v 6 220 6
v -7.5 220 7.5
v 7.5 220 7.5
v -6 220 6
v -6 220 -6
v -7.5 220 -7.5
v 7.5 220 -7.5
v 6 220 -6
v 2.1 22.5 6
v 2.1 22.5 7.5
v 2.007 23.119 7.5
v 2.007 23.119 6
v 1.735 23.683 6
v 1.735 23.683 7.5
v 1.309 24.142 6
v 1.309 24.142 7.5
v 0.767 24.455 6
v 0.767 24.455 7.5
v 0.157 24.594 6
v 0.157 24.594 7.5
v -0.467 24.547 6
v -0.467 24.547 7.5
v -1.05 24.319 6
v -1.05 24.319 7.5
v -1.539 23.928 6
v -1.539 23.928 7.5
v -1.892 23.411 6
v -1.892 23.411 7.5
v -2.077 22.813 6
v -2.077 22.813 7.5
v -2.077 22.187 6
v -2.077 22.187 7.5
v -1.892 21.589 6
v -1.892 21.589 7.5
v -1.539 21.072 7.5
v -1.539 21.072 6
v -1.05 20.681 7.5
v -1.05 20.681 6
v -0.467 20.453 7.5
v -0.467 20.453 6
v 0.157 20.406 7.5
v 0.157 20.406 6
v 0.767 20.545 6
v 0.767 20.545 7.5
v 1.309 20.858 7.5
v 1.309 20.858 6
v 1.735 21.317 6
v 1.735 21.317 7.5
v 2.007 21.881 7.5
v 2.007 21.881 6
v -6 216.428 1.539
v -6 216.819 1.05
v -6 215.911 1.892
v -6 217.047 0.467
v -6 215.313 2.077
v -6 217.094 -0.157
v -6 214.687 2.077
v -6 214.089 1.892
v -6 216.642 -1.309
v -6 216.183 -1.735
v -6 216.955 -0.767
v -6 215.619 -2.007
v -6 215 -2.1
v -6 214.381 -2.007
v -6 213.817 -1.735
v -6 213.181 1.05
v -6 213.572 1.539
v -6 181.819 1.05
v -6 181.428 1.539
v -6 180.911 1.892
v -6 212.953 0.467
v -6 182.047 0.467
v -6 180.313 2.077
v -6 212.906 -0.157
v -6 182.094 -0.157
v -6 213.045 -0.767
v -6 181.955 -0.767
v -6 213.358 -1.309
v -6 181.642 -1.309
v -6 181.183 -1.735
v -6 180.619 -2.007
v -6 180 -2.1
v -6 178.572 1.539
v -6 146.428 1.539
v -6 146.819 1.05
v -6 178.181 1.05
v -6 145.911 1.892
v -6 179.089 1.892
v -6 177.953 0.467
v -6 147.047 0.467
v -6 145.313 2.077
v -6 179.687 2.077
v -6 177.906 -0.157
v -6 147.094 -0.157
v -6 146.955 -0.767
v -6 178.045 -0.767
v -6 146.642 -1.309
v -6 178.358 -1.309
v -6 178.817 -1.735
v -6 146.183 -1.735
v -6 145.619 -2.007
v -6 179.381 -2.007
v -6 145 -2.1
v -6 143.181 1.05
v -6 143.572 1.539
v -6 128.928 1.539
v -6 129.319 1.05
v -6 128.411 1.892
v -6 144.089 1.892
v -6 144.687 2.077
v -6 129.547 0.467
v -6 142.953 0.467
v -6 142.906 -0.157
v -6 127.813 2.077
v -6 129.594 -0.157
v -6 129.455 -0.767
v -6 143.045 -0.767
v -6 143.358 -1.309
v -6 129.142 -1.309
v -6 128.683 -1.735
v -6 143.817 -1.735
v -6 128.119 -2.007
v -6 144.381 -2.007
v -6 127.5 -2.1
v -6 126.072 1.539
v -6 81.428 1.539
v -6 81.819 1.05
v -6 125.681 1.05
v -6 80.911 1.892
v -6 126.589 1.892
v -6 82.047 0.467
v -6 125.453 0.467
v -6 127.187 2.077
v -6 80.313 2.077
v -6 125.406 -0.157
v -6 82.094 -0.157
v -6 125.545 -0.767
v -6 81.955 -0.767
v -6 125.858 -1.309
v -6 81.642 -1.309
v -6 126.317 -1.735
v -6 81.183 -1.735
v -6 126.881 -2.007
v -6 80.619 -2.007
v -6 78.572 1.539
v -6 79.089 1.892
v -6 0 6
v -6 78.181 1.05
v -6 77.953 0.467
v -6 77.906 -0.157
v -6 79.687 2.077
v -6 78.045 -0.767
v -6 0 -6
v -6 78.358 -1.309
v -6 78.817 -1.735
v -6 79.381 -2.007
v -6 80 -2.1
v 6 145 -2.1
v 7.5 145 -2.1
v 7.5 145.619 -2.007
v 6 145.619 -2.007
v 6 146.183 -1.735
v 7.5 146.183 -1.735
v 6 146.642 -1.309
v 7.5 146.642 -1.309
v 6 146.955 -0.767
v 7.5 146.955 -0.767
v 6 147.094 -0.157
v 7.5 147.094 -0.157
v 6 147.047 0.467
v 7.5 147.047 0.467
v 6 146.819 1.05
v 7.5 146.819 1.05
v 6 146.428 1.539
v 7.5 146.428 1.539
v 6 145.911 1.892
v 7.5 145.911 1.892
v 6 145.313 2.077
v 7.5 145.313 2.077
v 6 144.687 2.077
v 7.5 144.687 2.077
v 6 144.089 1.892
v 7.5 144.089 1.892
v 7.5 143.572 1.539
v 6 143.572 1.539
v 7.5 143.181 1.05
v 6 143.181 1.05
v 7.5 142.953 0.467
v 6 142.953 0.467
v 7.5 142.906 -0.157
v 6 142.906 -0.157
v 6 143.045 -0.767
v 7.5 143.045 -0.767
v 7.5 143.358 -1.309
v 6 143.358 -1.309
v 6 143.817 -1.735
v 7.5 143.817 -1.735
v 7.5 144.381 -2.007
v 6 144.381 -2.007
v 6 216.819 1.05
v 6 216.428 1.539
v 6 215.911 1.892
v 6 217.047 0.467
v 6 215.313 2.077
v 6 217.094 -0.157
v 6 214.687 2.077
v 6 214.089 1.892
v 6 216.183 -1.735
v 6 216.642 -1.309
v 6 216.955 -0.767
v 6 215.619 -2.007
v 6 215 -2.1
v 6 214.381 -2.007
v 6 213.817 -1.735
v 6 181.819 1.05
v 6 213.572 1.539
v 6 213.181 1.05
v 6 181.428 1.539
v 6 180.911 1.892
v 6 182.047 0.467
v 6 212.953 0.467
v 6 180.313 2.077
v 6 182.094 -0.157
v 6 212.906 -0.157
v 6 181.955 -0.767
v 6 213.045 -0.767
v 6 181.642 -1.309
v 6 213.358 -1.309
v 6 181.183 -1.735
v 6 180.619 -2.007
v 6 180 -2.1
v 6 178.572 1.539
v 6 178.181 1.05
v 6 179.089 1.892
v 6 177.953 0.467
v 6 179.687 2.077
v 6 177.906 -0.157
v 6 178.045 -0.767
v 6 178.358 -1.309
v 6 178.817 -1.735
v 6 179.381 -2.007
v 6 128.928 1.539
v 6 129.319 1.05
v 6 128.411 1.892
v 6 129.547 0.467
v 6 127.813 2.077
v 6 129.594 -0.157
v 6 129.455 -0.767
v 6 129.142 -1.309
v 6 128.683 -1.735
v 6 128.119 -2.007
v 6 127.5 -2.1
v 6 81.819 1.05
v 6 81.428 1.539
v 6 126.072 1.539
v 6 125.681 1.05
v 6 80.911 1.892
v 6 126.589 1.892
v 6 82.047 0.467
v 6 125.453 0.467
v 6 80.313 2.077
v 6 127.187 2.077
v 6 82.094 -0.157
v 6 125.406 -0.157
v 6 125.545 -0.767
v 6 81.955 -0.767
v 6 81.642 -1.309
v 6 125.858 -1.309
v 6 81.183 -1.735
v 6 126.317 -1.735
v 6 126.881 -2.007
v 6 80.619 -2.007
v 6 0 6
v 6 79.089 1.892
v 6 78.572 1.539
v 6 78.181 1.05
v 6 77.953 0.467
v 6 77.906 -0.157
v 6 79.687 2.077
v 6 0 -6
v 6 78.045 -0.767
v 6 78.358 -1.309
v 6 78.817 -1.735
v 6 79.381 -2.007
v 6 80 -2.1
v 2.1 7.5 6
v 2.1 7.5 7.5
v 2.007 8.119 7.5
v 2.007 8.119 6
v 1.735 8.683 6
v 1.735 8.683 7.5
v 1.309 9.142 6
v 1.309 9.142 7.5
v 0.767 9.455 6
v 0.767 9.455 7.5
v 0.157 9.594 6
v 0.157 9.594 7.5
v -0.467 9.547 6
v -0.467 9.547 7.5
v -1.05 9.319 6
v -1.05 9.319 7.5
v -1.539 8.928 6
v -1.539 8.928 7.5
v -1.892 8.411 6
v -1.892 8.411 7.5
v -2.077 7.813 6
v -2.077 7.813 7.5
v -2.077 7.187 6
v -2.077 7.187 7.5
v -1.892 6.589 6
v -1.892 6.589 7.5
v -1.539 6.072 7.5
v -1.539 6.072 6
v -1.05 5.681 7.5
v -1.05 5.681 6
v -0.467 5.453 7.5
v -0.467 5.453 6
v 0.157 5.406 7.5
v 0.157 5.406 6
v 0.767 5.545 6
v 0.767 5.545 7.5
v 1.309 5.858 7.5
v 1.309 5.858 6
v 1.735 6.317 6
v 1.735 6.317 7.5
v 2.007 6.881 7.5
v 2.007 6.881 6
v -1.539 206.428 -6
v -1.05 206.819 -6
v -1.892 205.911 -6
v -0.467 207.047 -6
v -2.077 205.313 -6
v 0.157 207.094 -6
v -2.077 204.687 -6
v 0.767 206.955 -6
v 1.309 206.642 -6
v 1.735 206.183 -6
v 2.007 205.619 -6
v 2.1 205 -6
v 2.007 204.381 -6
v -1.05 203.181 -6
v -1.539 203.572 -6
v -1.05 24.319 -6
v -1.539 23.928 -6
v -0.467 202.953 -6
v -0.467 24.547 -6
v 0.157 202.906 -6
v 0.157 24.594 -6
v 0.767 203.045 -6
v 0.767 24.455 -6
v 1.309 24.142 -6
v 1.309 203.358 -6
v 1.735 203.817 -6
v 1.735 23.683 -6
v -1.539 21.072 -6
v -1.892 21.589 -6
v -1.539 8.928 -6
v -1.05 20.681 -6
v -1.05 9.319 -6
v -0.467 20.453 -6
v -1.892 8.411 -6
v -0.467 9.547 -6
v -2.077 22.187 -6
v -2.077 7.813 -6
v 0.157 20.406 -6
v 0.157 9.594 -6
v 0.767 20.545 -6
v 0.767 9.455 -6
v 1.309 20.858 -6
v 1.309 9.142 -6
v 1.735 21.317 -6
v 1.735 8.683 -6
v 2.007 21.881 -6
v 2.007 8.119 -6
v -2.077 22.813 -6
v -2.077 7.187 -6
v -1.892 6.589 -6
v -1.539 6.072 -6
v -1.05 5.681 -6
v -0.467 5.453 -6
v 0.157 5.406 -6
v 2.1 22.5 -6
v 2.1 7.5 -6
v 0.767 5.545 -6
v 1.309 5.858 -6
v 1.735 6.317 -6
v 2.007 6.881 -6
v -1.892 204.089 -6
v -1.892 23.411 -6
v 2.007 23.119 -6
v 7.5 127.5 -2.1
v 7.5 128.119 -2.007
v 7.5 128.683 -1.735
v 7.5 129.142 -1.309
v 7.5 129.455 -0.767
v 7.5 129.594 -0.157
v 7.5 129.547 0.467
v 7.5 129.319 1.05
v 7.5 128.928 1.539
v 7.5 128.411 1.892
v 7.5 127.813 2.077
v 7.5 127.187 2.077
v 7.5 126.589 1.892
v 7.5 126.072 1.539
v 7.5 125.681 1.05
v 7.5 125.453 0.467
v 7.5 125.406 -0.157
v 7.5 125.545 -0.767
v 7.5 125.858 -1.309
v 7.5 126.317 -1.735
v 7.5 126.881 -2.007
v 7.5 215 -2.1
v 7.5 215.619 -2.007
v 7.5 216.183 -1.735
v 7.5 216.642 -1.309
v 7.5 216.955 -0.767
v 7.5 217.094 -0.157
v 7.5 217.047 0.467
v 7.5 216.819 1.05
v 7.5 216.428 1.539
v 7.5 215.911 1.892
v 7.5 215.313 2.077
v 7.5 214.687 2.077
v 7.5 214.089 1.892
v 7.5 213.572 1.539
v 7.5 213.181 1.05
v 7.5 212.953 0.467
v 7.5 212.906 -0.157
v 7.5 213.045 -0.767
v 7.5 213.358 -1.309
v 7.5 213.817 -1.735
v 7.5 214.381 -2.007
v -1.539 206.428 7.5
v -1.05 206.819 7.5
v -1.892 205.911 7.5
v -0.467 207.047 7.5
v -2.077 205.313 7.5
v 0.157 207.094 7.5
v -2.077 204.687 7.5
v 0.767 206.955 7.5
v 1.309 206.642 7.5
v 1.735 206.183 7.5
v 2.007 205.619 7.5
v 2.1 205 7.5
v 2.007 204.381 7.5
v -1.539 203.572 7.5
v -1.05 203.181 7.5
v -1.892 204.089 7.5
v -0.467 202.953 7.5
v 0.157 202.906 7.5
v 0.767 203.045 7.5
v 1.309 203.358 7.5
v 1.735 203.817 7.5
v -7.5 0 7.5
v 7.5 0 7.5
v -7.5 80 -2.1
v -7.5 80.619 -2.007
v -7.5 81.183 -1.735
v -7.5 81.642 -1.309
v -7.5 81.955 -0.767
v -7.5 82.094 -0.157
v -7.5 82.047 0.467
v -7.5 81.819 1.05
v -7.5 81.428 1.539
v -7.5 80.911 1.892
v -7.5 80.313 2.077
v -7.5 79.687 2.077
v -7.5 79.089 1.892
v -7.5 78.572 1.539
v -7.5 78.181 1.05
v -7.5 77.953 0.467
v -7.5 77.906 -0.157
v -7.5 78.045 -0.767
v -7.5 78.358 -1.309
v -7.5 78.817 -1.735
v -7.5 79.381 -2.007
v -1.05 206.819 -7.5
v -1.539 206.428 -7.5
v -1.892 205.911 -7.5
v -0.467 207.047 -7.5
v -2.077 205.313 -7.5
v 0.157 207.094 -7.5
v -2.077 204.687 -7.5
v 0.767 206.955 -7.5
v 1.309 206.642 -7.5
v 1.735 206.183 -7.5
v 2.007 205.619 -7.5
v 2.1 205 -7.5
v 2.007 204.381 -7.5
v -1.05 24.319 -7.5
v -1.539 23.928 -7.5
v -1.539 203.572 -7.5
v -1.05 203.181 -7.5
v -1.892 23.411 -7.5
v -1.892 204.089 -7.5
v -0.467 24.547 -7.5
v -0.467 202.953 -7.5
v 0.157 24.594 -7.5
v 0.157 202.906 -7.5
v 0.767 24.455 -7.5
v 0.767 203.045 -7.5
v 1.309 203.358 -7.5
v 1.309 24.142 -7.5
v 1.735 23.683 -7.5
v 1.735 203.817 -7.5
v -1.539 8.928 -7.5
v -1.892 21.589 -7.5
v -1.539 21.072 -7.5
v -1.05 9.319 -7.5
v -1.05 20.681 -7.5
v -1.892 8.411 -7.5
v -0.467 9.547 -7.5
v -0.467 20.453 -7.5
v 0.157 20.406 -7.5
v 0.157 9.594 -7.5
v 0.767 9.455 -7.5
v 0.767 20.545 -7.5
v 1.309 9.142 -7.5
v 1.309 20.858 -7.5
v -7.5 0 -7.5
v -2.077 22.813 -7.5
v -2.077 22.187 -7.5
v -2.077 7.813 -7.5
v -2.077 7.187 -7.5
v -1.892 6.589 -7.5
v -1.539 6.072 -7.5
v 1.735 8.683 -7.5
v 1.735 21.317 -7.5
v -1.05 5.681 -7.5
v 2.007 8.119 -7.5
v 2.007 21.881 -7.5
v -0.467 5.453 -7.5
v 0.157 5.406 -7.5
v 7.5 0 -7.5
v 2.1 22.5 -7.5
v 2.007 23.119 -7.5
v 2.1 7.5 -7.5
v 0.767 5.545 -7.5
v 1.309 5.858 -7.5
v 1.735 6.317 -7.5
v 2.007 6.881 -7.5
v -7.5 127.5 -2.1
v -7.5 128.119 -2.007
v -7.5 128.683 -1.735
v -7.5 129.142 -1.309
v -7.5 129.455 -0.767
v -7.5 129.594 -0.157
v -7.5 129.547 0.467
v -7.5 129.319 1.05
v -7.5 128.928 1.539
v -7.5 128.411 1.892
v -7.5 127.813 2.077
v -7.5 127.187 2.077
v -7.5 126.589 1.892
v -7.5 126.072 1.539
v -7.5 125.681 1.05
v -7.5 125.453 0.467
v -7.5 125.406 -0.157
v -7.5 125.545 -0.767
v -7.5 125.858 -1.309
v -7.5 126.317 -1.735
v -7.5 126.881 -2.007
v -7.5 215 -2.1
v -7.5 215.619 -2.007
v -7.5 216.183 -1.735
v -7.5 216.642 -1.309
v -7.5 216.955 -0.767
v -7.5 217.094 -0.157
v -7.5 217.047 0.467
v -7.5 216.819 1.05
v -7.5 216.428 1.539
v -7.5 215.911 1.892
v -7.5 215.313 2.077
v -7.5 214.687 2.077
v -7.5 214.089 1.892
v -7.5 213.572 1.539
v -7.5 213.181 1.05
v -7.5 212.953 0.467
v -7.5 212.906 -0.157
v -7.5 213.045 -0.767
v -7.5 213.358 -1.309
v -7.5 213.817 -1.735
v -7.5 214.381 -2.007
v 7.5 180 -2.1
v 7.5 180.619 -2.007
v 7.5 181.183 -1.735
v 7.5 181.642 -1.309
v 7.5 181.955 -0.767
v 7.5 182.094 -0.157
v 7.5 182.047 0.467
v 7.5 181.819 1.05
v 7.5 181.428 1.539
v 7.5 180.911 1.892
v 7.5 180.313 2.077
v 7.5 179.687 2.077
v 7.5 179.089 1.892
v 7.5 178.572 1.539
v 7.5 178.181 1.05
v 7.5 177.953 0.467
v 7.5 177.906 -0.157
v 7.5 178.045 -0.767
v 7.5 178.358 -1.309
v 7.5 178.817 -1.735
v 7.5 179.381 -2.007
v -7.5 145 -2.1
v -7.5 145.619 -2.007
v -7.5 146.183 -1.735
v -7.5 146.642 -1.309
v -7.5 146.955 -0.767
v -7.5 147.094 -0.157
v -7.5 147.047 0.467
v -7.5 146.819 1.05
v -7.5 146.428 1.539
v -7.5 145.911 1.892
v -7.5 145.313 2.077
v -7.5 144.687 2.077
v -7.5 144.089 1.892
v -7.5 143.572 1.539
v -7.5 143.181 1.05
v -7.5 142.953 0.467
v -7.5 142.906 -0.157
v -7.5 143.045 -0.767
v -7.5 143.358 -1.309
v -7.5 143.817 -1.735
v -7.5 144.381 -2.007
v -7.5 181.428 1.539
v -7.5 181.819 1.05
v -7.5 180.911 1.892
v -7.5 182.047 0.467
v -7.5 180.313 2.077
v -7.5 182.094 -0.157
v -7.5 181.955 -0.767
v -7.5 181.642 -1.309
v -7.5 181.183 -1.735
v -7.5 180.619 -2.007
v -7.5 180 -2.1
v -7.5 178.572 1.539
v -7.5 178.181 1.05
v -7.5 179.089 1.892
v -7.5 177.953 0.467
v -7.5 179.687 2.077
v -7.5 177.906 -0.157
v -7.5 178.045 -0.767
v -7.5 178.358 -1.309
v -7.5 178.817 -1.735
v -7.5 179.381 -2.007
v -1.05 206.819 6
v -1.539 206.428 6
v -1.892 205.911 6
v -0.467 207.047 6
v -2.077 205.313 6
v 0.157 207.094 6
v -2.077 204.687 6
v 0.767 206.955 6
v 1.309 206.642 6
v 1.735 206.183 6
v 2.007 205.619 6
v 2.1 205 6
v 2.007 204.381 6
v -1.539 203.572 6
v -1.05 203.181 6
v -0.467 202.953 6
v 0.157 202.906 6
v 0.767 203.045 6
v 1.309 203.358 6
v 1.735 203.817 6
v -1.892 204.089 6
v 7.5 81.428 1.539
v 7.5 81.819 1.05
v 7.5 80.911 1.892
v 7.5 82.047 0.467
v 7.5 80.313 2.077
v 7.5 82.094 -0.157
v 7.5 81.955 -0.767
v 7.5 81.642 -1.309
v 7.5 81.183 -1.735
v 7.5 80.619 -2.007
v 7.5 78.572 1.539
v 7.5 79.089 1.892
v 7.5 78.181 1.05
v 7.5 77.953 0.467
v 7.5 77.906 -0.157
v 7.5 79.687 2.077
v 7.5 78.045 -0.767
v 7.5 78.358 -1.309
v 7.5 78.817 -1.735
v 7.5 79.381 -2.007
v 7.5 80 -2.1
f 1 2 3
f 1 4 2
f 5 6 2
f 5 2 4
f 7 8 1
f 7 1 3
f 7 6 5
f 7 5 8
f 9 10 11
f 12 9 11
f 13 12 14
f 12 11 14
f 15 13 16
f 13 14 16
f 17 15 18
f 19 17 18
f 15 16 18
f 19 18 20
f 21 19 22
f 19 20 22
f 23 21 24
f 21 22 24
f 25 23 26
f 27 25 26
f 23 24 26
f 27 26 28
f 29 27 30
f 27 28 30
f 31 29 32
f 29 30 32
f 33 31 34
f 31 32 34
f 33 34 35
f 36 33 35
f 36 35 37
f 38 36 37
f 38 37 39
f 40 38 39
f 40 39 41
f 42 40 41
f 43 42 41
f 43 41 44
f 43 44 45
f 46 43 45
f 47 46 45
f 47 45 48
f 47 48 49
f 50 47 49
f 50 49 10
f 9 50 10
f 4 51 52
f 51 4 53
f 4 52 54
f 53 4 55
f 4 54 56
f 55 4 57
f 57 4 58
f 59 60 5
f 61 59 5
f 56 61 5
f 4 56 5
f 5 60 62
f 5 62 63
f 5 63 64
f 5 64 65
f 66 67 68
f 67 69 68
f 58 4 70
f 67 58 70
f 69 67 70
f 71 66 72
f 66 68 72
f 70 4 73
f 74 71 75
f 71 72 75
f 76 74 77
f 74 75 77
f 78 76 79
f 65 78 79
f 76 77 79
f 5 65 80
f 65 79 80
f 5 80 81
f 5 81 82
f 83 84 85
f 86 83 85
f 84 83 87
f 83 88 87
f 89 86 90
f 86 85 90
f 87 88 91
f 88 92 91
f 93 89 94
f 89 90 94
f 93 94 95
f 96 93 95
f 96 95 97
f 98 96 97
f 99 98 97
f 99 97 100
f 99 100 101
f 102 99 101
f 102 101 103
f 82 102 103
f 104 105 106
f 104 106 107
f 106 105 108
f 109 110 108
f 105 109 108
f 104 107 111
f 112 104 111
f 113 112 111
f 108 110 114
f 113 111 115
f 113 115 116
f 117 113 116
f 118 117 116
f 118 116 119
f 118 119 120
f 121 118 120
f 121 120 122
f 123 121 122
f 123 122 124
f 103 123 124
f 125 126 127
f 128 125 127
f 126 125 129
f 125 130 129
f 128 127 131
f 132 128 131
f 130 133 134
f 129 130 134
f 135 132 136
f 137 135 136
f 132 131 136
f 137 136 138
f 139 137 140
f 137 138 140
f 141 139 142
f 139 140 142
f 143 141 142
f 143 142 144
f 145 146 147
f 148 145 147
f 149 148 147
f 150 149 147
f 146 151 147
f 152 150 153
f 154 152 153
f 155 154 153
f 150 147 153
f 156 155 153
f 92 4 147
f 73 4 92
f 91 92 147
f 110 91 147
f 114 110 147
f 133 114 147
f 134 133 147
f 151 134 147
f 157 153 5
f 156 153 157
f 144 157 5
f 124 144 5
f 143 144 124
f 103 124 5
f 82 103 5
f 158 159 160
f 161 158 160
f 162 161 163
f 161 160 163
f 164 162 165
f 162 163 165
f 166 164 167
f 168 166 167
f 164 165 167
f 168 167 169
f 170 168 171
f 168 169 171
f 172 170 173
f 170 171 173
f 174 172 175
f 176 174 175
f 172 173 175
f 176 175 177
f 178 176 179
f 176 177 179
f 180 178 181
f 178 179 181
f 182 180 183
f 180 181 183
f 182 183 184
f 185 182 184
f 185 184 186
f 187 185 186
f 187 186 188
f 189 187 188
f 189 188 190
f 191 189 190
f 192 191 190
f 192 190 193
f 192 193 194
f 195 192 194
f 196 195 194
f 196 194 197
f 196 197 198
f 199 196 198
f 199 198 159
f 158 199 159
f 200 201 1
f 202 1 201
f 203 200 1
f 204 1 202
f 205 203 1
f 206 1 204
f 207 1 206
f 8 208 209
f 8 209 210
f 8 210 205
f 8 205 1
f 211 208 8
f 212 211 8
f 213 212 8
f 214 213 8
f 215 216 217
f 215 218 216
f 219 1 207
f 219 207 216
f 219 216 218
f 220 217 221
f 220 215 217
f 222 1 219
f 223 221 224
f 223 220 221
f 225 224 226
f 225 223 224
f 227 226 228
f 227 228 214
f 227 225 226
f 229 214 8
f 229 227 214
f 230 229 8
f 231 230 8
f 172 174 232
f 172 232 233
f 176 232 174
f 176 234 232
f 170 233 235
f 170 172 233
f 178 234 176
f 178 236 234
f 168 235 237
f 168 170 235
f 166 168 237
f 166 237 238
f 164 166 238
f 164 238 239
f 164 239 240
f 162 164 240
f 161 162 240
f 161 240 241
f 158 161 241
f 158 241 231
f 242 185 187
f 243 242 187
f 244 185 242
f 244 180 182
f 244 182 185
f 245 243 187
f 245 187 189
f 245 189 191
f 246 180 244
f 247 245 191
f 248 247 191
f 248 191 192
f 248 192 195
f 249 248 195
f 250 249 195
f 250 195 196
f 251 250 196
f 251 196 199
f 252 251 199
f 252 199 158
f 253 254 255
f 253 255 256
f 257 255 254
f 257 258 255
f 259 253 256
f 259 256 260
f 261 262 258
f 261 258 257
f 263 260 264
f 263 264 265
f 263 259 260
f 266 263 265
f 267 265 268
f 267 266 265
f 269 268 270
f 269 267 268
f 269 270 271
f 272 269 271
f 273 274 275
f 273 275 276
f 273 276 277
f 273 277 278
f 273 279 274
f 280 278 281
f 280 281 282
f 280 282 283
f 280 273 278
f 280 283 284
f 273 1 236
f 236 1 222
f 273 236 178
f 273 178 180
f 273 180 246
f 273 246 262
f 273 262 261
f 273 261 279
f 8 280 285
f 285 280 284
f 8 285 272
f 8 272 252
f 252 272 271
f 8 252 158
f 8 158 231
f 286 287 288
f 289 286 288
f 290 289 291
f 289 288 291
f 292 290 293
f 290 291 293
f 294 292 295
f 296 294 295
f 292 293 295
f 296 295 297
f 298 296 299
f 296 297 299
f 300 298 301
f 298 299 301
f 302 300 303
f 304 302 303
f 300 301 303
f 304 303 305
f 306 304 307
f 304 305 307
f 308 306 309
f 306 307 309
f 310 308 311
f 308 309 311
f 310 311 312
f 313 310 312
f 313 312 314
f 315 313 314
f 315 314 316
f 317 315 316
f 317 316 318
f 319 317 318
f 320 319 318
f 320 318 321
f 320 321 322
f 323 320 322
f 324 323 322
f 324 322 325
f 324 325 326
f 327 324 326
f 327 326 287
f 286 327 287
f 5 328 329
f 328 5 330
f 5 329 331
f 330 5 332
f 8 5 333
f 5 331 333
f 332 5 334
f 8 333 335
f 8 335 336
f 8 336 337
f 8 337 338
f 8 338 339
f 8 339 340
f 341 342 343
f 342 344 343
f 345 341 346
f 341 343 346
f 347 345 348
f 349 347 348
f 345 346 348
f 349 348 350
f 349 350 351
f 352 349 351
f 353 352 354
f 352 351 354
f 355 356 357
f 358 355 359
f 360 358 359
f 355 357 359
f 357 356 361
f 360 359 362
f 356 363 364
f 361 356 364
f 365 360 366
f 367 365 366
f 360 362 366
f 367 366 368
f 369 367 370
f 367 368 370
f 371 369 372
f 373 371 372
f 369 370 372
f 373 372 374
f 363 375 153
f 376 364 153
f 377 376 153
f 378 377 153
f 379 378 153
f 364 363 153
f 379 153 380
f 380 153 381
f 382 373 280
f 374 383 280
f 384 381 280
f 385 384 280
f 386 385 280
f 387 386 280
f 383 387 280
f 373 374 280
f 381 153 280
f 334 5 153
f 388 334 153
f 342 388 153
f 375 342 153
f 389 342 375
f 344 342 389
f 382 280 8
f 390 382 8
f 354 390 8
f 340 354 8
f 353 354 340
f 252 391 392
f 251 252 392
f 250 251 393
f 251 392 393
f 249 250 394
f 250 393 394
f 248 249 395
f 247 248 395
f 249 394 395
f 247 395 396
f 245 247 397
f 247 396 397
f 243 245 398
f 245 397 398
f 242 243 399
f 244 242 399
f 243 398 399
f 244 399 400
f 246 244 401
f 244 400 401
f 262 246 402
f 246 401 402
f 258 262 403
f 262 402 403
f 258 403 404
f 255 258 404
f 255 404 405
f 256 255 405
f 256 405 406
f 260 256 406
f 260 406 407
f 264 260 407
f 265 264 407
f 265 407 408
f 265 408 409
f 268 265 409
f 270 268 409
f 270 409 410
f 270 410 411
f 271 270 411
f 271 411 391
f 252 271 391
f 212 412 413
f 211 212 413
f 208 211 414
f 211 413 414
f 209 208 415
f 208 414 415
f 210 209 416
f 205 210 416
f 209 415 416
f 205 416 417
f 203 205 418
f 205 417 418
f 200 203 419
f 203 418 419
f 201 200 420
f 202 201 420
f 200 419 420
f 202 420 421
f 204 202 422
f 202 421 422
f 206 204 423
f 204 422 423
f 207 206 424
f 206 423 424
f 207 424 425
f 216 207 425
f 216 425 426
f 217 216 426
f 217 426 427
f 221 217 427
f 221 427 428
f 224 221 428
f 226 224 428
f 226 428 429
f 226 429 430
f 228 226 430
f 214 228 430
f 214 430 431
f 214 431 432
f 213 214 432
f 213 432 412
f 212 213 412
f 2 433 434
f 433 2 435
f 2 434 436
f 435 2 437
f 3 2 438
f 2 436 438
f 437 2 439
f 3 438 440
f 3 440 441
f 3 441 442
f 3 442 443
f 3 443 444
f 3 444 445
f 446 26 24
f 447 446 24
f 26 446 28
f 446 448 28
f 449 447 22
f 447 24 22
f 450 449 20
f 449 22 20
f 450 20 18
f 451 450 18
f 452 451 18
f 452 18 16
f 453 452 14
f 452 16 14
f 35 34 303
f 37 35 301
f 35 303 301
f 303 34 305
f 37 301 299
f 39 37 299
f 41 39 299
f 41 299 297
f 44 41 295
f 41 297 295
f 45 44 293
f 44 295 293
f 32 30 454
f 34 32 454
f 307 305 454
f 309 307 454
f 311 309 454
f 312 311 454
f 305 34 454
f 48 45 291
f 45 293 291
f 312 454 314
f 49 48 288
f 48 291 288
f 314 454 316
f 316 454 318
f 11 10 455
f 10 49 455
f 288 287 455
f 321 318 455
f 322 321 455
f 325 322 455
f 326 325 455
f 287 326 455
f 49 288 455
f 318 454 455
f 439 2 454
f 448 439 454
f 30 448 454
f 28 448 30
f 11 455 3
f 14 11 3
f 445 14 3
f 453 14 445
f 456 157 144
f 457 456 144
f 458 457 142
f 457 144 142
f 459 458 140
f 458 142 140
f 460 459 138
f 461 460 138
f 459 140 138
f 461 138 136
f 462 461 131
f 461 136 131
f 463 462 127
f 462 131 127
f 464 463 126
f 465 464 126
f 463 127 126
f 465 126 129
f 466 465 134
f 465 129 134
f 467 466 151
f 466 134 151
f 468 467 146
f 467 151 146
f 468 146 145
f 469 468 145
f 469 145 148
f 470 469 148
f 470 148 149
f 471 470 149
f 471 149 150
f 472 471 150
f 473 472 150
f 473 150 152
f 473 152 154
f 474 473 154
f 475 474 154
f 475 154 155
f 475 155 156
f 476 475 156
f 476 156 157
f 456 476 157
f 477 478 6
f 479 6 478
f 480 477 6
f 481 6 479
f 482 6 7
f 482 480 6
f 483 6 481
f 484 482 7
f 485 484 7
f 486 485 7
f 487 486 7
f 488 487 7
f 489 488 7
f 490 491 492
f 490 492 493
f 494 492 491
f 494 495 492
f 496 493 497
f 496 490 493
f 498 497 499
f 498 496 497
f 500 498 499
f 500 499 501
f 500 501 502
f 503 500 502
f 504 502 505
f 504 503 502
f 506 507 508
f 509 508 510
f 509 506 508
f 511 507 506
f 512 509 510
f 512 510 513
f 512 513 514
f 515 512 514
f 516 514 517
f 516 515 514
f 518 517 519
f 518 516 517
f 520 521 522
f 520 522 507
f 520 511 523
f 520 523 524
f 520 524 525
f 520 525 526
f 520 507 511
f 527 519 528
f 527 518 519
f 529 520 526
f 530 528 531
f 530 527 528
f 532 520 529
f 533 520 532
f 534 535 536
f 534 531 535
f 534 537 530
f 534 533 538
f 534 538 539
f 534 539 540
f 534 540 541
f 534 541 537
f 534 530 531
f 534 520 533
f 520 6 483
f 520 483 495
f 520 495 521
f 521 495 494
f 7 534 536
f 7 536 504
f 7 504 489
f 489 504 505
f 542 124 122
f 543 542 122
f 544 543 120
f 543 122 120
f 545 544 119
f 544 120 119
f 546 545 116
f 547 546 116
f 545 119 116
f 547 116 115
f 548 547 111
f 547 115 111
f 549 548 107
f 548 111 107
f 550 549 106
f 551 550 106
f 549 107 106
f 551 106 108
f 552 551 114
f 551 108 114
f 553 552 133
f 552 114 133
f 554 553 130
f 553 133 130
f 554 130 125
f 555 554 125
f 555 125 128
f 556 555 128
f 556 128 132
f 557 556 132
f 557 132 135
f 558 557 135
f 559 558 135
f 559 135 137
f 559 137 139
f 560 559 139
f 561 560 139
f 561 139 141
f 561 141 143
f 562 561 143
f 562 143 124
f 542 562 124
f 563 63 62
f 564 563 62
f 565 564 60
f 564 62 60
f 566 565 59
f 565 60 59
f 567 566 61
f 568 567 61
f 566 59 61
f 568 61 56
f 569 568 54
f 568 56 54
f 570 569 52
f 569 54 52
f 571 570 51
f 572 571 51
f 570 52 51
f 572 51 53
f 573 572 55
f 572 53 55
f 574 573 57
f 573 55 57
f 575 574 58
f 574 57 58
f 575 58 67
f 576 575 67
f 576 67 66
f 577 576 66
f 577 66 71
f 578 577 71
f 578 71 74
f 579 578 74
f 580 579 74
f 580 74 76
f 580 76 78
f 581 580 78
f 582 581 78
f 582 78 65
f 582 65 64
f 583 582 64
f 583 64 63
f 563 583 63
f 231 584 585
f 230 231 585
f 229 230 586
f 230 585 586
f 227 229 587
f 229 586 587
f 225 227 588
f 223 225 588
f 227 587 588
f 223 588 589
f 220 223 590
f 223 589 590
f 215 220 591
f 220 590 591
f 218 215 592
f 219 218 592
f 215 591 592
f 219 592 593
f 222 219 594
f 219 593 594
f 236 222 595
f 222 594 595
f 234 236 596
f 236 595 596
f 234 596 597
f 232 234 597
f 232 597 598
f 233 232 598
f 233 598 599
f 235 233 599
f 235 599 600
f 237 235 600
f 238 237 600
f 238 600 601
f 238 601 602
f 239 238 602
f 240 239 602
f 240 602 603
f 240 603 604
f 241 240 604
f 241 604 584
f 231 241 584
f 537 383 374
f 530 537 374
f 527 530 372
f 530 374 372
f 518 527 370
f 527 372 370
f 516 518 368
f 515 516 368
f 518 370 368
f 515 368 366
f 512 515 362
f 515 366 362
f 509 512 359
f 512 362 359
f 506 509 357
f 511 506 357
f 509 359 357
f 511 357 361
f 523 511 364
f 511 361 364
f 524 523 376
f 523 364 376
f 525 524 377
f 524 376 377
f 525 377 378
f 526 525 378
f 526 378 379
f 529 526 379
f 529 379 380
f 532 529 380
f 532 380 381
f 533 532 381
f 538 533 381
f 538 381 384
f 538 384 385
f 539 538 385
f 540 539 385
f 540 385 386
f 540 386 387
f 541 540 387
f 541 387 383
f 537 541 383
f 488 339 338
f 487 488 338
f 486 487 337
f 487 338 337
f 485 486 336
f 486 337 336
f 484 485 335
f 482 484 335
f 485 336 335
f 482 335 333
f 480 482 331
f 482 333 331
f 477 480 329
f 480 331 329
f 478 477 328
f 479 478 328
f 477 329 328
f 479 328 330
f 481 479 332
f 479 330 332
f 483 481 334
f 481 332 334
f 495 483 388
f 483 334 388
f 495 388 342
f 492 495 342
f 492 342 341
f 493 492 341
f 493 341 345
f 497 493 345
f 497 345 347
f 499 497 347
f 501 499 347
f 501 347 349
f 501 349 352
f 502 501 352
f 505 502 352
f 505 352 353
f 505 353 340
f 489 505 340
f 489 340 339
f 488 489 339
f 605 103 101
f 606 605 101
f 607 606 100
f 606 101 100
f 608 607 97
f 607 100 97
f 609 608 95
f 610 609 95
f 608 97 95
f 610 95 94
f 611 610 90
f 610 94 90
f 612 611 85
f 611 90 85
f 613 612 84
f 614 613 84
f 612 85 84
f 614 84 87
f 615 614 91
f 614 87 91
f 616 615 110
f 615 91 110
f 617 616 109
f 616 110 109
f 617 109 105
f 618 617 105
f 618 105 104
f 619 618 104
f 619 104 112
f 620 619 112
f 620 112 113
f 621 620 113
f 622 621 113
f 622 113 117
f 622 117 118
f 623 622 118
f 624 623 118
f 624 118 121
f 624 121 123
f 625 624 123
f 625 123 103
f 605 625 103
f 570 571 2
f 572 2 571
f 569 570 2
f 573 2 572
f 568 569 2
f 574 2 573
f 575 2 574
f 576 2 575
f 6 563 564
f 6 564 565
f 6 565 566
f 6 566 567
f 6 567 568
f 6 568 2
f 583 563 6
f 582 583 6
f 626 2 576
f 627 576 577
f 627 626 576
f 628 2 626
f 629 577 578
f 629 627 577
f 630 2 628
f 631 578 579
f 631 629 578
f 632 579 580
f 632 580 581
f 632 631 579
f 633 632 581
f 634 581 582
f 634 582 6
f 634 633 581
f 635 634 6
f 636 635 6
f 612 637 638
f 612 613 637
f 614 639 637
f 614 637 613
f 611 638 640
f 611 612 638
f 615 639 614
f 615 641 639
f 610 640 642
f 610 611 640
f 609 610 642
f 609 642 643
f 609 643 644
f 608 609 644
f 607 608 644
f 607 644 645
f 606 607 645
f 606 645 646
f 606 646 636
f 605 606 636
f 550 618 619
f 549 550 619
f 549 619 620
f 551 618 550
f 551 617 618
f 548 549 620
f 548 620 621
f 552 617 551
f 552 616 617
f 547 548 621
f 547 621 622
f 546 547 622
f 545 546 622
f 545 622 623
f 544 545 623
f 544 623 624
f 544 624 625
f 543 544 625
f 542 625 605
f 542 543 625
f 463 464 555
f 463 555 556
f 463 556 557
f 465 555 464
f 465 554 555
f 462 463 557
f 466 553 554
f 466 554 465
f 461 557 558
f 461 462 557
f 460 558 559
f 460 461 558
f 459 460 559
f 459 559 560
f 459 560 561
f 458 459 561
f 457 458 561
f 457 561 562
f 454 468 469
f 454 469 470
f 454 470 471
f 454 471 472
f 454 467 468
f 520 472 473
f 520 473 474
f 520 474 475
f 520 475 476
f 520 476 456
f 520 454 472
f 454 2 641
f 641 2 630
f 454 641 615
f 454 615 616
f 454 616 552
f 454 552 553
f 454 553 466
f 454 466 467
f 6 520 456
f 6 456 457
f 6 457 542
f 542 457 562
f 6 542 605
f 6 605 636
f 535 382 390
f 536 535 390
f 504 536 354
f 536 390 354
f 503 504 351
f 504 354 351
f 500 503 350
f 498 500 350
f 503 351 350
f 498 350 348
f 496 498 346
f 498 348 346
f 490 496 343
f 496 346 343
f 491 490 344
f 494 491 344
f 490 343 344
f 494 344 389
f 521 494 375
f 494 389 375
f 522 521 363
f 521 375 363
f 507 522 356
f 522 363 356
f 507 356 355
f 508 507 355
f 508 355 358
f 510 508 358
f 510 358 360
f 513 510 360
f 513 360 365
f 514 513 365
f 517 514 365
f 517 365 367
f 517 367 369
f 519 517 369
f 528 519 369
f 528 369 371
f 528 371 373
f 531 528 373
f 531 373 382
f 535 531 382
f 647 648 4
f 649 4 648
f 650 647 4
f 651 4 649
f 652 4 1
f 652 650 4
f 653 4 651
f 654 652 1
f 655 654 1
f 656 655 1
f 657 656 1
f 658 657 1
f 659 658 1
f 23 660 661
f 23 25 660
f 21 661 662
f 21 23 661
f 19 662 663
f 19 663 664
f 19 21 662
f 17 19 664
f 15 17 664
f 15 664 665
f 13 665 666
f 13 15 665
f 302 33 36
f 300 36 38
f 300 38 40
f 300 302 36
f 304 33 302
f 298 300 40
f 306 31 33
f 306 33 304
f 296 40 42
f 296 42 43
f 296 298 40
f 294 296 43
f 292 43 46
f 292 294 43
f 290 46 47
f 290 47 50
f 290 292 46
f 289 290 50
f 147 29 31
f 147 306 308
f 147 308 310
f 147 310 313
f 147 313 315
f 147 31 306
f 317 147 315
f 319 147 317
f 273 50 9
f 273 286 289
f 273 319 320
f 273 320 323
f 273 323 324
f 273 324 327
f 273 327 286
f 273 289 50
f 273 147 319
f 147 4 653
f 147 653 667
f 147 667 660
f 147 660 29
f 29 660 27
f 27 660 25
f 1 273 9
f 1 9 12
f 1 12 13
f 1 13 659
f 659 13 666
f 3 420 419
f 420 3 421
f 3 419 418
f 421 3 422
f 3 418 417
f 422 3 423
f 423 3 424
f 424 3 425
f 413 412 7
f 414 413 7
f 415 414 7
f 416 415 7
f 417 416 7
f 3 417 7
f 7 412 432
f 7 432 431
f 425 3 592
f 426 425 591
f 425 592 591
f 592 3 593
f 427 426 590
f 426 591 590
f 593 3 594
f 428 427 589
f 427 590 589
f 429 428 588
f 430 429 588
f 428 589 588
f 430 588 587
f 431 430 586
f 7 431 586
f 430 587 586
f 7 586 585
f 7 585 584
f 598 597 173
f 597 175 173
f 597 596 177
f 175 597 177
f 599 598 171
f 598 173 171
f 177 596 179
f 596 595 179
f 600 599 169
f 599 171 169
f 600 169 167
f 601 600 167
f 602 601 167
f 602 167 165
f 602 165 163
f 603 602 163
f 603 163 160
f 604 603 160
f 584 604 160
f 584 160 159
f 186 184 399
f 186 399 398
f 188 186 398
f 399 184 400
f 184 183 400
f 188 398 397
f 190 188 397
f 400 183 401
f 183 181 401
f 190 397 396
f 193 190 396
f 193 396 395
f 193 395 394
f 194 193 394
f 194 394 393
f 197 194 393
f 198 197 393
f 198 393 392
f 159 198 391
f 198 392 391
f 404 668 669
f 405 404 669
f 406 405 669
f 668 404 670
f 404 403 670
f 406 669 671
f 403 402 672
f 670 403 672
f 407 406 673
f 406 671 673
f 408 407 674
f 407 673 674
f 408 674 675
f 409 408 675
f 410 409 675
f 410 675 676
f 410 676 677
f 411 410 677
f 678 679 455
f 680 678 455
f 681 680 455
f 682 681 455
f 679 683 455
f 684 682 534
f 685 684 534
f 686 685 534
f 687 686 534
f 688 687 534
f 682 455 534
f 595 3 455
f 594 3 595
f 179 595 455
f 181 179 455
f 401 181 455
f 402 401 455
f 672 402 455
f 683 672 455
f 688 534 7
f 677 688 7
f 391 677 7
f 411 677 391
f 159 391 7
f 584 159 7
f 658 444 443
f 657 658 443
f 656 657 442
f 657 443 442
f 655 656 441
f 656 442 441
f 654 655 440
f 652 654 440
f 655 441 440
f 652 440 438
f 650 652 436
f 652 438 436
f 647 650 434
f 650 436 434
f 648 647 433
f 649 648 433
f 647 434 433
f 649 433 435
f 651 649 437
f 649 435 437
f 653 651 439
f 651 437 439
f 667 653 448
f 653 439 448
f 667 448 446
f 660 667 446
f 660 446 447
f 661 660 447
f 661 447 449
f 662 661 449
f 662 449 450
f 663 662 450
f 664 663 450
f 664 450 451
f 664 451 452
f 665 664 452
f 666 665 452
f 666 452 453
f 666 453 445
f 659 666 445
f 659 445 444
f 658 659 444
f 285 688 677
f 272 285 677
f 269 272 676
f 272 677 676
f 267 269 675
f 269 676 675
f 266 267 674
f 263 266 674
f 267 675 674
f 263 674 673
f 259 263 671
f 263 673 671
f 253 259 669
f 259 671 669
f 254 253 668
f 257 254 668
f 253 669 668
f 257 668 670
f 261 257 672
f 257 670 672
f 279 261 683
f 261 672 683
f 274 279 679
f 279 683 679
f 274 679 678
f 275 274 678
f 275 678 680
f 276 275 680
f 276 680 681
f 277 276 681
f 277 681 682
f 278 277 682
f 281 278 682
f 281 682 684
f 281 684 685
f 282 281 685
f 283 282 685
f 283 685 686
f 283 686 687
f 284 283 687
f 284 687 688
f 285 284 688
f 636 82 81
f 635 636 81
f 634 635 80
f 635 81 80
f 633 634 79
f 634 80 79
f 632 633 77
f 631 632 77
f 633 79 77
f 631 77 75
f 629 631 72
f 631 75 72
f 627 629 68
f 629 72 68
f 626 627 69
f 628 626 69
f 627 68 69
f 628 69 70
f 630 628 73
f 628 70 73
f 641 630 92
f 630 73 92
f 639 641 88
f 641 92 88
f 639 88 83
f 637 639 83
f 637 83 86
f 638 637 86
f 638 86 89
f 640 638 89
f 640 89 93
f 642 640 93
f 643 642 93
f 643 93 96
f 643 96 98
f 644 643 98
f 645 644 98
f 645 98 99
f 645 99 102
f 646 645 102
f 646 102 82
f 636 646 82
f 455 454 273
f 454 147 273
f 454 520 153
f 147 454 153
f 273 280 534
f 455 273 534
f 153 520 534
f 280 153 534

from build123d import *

# Parameters (mm, degrees)
SKETCH_1_W          = 15
SKETCH_1_H          = 15
SKETCH_1_W_2        = 12
SKETCH_1_H_2        = 12
EXTRUDE_1_DEPTH     = 220
SKETCH_2_R          = 2.1
CUT_EXTRUDE_1_DEPTH = 221.638278637
SKETCH_3_R          = 2.1
CUT_EXTRUDE_2_DEPTH = 221.638278637
SKETCH_4_R          = 2.1
CUT_EXTRUDE_3_DEPTH = 221.638278637
SKETCH_5_R          = 2.1
CUT_EXTRUDE_4_DEPTH = 221.638278637
SKETCH_6_R          = 2.1
CUT_EXTRUDE_5_DEPTH = 221.638278637


with BuildPart() as part:
    # ｽｹｯﾁ1 → 押し出し-薄板1 (new body)
    with BuildSketch(Plane(origin=(0, 0, 0), x_dir=(1, 0, 0), z_dir=(0, 1, 0))):
        Rectangle(SKETCH_1_W, SKETCH_1_H)
        Rectangle(SKETCH_1_W_2, SKETCH_1_H_2, mode=Mode.SUBTRACT)
    extrude(amount=EXTRUDE_1_DEPTH)

    # ｽｹｯﾁ2 → ｶｯﾄ - 押し出し1 (cut, through all)
    with BuildSketch(Plane(origin=(7.5, 0, 0), x_dir=(0, 0, -1), z_dir=(1, 0, 0))):
        with Locations((0, 215)):
            Circle(SKETCH_2_R)
    extrude(amount=-CUT_EXTRUDE_1_DEPTH, mode=Mode.SUBTRACT)

    # ｽｹｯﾁ3 → ｶｯﾄ - 押し出し2 (cut, through all)
    with BuildSketch(Plane(origin=(7.5, 0, 0), x_dir=(0, 0, -1), z_dir=(1, 0, 0))):
        with Locations((0, 145)):
            Circle(SKETCH_3_R)
        with Locations((0, 180)):
            Circle(SKETCH_3_R)
    extrude(amount=-CUT_EXTRUDE_2_DEPTH, mode=Mode.SUBTRACT)

    # ｽｹｯﾁ4 → ｶｯﾄ - 押し出し3 (cut, through all)
    with BuildSketch(Plane.XY.offset(7.5)):
        with Locations((0, 205)):
            Circle(SKETCH_4_R)
    extrude(amount=-CUT_EXTRUDE_3_DEPTH, mode=Mode.SUBTRACT)

    # ｽｹｯﾁ5 → ｶｯﾄ - 押し出し4 (cut, through all)
    with BuildSketch(Plane.XY.offset(7.5)):
        with Locations((0, 22.5)):
            Circle(SKETCH_5_R)
        with Locations((0, 7.5)):
            Circle(SKETCH_5_R)
    extrude(amount=-CUT_EXTRUDE_4_DEPTH, mode=Mode.SUBTRACT)

    # ｽｹｯﾁ6 → ｶｯﾄ - 押し出し5 (cut, through all)
    with BuildSketch(Plane(origin=(7.5, 0, 0), x_dir=(0, 0, -1), z_dir=(1, 0, 0))):
        with Locations((0, 80)):
            Circle(SKETCH_6_R)
        with Locations((0, 127.5)):
            Circle(SKETCH_6_R)
    extrude(amount=-CUT_EXTRUDE_5_DEPTH, mode=Mode.SUBTRACT)


solid = part.part
